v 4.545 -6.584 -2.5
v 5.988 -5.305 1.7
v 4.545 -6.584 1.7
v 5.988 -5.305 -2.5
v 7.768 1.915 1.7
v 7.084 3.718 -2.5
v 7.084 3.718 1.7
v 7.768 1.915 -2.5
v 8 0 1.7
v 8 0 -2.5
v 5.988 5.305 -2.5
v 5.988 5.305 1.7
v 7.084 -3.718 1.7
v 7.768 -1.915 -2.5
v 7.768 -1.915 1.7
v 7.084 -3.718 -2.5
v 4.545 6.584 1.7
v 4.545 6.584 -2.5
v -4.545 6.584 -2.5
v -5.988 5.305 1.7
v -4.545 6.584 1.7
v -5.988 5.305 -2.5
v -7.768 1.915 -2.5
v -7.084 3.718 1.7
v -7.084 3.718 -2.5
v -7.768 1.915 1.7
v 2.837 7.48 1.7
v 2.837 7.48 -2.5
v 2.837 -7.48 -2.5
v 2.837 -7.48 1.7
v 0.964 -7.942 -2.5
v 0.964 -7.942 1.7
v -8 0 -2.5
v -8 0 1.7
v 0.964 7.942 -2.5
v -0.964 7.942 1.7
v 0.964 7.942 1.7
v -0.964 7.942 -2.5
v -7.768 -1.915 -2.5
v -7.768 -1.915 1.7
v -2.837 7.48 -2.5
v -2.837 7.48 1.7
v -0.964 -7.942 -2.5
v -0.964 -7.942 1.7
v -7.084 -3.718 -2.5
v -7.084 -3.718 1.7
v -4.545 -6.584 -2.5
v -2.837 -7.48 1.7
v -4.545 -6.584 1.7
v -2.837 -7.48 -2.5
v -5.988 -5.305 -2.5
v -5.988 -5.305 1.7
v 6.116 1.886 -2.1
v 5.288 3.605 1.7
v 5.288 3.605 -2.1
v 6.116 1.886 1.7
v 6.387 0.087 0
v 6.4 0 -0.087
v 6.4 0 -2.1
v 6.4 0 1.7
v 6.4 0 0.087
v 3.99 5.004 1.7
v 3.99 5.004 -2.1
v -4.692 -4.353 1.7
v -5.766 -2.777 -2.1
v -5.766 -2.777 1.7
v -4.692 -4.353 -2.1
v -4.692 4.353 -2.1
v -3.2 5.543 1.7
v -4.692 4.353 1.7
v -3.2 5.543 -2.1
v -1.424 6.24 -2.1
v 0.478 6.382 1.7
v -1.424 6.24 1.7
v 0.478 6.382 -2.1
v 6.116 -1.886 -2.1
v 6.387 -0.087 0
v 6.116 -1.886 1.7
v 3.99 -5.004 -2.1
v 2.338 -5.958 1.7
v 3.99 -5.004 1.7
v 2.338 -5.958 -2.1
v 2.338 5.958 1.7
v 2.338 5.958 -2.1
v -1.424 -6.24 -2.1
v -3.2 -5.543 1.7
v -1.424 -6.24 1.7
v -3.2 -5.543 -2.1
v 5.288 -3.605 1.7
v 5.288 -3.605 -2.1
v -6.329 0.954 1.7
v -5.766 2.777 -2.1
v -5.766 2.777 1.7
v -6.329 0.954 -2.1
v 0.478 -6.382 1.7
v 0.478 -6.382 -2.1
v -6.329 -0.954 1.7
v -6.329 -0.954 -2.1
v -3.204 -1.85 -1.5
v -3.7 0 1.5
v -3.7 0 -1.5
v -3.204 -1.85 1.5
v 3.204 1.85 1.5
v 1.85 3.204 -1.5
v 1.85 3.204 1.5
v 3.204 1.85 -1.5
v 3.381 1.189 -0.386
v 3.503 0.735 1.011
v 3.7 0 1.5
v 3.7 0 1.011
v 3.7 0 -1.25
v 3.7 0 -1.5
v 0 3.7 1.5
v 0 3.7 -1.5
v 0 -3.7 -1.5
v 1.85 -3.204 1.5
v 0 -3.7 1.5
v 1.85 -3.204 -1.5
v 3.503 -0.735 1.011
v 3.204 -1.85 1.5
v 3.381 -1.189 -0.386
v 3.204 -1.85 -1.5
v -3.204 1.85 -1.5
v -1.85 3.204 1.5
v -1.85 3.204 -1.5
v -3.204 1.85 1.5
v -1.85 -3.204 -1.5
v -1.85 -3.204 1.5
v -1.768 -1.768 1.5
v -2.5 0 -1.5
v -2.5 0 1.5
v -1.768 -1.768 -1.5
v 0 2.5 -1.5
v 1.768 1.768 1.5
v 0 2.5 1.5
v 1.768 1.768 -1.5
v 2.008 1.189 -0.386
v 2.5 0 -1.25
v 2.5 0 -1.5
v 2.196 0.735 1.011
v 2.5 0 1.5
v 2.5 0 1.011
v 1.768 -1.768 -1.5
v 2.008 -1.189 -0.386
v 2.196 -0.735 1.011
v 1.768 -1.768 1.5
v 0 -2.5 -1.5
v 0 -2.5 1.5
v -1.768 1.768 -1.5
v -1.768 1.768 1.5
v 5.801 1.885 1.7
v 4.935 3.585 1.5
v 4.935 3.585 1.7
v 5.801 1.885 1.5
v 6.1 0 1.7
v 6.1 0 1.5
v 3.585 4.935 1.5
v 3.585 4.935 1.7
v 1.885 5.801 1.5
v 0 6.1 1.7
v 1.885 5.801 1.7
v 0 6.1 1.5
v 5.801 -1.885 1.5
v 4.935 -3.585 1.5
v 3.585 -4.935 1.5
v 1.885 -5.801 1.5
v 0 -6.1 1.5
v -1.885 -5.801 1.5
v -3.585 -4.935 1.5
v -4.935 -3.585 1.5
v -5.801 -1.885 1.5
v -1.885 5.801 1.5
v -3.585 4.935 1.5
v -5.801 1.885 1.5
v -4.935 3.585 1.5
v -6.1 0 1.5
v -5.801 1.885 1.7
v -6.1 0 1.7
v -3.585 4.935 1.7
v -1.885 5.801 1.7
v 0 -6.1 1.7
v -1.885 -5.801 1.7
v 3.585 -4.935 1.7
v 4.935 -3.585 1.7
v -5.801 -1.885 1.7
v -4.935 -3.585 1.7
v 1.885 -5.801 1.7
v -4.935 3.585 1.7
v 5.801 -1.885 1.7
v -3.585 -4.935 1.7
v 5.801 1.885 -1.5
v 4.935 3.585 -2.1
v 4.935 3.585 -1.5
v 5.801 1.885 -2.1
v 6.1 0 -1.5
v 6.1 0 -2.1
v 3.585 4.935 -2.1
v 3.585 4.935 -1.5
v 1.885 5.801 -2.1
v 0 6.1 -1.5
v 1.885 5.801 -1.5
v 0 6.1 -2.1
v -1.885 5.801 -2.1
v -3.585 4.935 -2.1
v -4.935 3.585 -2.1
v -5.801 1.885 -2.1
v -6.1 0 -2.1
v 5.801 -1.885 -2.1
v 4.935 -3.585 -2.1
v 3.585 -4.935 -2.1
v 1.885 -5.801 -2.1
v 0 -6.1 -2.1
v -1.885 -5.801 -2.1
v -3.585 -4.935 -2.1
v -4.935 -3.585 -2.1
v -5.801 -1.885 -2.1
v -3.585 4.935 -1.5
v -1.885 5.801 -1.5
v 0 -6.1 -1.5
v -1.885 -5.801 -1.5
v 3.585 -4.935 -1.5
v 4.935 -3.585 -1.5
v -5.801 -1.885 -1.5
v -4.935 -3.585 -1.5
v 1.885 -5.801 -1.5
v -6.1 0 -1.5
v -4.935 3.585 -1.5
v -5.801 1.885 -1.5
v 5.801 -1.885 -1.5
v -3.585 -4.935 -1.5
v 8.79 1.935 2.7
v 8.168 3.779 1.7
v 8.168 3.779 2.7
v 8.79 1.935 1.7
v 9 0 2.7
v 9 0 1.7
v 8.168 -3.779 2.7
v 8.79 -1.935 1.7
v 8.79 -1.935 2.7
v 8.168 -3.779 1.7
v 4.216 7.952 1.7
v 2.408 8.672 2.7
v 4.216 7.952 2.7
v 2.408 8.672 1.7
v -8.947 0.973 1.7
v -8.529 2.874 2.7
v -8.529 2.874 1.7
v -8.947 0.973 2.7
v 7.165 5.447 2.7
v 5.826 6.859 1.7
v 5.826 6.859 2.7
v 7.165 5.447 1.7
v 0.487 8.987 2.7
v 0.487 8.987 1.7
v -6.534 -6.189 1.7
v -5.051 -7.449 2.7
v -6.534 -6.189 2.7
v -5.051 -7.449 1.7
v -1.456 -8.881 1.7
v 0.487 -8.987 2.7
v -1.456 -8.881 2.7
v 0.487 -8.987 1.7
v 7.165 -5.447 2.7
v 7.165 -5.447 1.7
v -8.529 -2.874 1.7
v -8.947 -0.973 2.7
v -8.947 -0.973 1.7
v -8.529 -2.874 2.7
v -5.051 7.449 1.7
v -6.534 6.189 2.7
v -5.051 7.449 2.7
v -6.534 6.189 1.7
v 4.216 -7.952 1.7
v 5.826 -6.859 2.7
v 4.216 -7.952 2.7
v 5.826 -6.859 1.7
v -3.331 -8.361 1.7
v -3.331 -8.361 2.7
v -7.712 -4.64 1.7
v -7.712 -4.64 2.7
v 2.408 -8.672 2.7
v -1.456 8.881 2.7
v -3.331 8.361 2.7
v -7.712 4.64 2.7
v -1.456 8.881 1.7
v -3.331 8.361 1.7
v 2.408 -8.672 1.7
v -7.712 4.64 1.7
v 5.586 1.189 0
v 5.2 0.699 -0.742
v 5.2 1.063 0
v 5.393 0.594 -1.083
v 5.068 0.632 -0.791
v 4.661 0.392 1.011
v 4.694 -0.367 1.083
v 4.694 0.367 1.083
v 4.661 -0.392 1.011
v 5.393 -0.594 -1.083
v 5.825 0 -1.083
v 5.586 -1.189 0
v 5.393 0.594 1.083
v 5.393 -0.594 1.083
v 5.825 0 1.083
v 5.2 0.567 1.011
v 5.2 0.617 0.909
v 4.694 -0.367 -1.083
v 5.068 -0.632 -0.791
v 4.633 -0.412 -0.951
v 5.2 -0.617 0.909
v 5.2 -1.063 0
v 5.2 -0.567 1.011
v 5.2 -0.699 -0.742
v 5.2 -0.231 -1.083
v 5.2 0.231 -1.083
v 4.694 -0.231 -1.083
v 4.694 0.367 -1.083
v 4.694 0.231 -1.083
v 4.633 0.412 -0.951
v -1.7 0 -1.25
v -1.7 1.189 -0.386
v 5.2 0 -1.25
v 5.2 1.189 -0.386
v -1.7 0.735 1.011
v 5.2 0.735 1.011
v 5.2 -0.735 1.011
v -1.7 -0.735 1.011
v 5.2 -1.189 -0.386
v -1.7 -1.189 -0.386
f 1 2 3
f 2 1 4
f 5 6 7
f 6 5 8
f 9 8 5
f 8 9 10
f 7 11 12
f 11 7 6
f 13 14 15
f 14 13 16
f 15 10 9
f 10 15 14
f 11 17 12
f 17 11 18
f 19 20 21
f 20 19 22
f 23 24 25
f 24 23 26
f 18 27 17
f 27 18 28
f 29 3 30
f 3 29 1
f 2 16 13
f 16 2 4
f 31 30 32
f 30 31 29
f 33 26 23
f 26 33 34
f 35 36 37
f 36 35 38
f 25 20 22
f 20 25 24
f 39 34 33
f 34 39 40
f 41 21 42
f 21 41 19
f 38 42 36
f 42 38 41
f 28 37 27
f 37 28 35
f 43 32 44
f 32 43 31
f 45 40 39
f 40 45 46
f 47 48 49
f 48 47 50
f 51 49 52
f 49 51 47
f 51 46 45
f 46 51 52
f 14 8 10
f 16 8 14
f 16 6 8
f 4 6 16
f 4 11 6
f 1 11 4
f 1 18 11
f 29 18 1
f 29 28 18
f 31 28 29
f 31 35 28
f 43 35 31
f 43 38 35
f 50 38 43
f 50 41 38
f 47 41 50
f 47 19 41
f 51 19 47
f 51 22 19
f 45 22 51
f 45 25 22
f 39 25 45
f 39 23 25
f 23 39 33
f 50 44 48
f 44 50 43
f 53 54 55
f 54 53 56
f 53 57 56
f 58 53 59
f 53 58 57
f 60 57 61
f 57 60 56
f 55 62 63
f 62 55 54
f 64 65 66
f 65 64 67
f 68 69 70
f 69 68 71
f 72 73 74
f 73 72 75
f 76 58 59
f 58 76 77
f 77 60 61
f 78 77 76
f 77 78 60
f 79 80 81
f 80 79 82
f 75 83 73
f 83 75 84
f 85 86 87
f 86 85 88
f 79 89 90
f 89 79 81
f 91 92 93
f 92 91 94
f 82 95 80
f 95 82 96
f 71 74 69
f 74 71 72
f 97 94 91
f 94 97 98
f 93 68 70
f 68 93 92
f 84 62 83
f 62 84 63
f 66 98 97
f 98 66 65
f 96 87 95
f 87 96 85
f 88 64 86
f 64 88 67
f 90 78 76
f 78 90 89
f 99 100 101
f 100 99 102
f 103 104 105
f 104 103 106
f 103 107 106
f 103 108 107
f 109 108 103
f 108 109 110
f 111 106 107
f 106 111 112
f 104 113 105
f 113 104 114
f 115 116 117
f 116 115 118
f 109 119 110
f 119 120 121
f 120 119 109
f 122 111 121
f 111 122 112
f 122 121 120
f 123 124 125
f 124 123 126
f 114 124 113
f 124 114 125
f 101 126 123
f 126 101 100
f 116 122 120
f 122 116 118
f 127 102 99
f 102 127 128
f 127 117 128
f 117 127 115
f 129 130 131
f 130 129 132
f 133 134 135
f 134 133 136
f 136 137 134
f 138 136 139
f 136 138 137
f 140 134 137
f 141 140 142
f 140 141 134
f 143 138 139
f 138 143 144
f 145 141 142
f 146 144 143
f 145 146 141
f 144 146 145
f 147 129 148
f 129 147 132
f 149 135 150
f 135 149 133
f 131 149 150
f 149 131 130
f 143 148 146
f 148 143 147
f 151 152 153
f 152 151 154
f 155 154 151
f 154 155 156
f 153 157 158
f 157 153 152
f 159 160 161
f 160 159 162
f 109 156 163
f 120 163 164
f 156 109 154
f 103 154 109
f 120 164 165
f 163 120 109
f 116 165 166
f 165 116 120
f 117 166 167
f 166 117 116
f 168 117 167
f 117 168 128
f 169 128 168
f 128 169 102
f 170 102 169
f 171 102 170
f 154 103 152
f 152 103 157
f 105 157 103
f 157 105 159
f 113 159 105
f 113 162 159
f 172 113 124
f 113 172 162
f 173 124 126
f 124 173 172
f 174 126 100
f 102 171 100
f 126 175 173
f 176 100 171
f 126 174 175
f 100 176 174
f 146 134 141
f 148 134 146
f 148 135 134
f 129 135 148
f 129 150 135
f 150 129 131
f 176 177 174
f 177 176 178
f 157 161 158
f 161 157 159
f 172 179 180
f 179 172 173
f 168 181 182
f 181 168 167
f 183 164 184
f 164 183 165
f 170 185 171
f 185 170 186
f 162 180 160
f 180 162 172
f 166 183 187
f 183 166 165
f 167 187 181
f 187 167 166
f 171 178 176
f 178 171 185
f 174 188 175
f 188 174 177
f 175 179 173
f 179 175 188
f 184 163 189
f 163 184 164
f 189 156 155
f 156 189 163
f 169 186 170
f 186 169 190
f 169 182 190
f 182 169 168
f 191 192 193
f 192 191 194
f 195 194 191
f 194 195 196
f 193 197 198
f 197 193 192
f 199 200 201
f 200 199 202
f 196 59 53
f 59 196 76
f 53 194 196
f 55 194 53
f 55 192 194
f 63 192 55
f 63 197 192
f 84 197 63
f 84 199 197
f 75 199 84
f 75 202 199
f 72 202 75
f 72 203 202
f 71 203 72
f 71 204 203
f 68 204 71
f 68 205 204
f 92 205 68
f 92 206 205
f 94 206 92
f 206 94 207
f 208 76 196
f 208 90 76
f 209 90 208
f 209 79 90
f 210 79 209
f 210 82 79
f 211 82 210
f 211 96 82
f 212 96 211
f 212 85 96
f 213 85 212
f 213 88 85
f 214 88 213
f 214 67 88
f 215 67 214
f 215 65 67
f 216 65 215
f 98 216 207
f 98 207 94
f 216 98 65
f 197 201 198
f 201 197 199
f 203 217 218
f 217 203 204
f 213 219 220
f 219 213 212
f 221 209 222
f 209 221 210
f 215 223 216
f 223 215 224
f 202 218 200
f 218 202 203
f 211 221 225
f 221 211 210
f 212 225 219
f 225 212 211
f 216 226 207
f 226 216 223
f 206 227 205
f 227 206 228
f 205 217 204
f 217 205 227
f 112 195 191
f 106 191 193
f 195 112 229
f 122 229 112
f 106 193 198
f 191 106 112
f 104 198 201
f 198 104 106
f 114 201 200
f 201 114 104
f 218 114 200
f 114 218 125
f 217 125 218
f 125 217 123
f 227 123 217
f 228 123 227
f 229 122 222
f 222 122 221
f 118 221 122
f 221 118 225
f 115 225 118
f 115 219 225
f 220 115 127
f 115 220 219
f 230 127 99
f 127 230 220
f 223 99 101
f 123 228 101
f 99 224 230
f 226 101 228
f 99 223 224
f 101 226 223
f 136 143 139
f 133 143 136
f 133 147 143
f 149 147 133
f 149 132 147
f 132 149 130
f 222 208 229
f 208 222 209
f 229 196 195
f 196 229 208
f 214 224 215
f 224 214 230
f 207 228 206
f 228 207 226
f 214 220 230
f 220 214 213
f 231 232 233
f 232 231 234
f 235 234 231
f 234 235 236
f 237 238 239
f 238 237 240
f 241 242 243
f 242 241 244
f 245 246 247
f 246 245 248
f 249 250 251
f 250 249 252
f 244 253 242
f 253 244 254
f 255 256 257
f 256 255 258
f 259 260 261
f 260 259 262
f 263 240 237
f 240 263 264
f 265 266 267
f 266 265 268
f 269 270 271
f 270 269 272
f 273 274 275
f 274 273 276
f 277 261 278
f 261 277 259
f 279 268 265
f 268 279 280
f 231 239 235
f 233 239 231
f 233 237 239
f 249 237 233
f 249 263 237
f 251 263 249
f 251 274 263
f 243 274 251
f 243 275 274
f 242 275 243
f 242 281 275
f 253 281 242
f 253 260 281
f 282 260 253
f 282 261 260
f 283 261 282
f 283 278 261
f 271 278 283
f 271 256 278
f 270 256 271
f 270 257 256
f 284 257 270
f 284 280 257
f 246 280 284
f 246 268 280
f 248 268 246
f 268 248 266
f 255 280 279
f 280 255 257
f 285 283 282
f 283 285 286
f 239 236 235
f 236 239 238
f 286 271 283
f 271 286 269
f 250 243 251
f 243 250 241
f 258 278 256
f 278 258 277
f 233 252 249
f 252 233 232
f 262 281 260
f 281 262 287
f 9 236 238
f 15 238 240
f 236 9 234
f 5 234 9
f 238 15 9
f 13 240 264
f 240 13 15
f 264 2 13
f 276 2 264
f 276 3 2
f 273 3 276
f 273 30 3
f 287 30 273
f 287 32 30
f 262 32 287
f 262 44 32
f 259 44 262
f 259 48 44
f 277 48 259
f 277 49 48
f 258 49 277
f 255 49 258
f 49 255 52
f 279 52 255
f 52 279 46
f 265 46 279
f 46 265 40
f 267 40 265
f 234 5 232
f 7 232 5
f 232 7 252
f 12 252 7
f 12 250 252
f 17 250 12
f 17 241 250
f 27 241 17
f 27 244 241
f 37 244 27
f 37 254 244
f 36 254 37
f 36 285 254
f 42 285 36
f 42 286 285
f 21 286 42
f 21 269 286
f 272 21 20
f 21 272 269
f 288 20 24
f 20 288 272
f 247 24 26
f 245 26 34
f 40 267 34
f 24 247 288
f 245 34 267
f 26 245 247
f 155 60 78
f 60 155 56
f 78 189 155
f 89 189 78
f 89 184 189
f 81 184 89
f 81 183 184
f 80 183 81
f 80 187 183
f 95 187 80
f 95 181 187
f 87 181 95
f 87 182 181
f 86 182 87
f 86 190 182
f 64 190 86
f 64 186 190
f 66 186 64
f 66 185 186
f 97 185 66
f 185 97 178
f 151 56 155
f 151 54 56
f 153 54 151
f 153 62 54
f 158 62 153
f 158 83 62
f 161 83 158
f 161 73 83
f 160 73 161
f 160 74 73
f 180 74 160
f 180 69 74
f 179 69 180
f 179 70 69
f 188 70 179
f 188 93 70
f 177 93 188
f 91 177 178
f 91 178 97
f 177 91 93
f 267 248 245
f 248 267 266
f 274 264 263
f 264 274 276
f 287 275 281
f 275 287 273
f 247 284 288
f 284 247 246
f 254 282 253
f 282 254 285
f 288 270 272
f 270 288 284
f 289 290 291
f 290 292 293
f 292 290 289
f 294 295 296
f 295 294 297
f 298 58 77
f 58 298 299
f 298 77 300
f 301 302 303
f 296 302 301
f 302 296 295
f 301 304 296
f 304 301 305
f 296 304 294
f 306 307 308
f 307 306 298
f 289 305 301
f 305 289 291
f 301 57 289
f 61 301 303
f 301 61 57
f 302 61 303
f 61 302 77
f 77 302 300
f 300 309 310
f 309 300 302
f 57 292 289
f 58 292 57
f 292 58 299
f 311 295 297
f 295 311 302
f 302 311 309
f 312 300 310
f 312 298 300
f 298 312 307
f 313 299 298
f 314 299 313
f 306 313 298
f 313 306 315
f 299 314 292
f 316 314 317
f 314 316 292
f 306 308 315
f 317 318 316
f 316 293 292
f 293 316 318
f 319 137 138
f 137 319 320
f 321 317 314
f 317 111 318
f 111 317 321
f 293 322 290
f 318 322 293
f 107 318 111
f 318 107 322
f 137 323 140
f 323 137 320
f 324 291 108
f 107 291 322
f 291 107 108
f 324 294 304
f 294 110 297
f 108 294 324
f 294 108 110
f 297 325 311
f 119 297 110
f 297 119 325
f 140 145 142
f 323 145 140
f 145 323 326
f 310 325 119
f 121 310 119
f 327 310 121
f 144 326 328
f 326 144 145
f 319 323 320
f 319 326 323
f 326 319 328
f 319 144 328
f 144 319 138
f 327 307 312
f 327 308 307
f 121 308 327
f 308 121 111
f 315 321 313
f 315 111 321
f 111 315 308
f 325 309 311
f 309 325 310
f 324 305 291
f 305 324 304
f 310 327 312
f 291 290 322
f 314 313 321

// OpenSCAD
// Parameters
bore_diameter_mm = 5; //[2.5:10:0.1]
outer_diameter_mm = 16; //[8:32:0.1]
width_mm = 5; //[2.5:10:0.1]
flange_diameter_mm = 18; //[9:36:0.1]
flange_width_mm = 1; //[0.5:3:0.1]
rim_radial_mm = 1.6; //[0.8:3.2:0.1]
hub_radial_mm = 1.2; //[0.6:2.4:0.1]
shield_thickness_mm = 0.6; //[0.3:1.2:0.05]
shield_radial_gap_mm = 0.3; //[0.1:0.8:0.05]
chamfer_mm = 0.4; //[0.2:1:0.05]
ball_diameter_mm = 2.5; //[1.5:4:0.1]
ball_radial_position_mm = 5.2; //[3.5:7:0.1]
overlap_mm = 0.8; //[0.5:2:0.1]

// Ball Bearing - complete geometry
module ball_bearing() {
  color("Silver") {
    // Outer race
    difference() {
      cylinder(r=outer_diameter_mm/2, h=width_mm, center=true);
      cylinder(r=outer_diameter_mm/2 - rim_radial_mm, h=width_mm + 2*overlap_mm, center=true);
    }
    // Inner race
    difference() {
      cylinder(r=bore_diameter_mm/2 + hub_radial_mm, h=width_mm, center=true);
      cylinder(r=bore_diameter_mm/2, h=width_mm + 2*overlap_mm, center=true);
    }
    // Flange
    translate([0, 0, width_mm/2 + flange_width_mm/2 - overlap_mm])
      cylinder(r=flange_diameter_mm/2, h=flange_width_mm, center=true);
    // Shields
    union() {
      translate([0, 0, width_mm/2 - shield_thickness_mm/2 - overlap_mm/2])
        cylinder(r=outer_diameter_mm/2 - rim_radial_mm - shield_radial_gap_mm, h=shield_thickness_mm, center=true);
      translate([0, 0, -width_mm/2 + shield_thickness_mm/2 + overlap_mm/2])
        cylinder(r=outer_diameter_mm/2 - rim_radial_mm - shield_radial_gap_mm, h=shield_thickness_mm, center=true);
    }
    // Chamfers
    union() {
      translate([0, 0, width_mm/2 - chamfer_mm/2])
        cylinder(r1=outer_diameter_mm/2, r2=outer_diameter_mm/2 - chamfer_mm, h=chamfer_mm, center=true);
      translate([0, 0, -width_mm/2 + chamfer_mm/2])
        cylinder(r1=outer_diameter_mm/2 - chamfer_mm, r2=outer_diameter_mm/2, h=chamfer_mm, center=true);
      translate([0, 0, width_mm/2 - chamfer_mm/2])
        cylinder(r1=bore_diameter_mm/2 + chamfer_mm, r2=bore_diameter_mm/2, h=chamfer_mm, center=true);
      translate([0, 0, -width_mm/2 + chamfer_mm/2])
        cylinder(r1=bore_diameter_mm/2, r2=bore_diameter_mm/2 + chamfer_mm, h=chamfer_mm, center=true);
    }
  }
}

// Bearing Ball - complete geometry
module bearing_ball() {
  color("SteelBlue") {
    // Ball
    translate([ball_radial_position_mm, 0, 0])
      sphere(r=ball_diameter_mm/2, center=true);
    // Bridge
    translate([(ball_radial_position_mm - (ball_radial_position_mm + ball_diameter_mm - overlap_mm)/2), 0, 0])
      rotate([0, 90, 0])
        cylinder(r=ball_diameter_mm/2, h=ball_radial_position_mm + ball_diameter_mm - overlap_mm, center=true);
  }
}

// Assembly
module assembly() {
  ball_bearing();
  bearing_ball();
}

assembly();
